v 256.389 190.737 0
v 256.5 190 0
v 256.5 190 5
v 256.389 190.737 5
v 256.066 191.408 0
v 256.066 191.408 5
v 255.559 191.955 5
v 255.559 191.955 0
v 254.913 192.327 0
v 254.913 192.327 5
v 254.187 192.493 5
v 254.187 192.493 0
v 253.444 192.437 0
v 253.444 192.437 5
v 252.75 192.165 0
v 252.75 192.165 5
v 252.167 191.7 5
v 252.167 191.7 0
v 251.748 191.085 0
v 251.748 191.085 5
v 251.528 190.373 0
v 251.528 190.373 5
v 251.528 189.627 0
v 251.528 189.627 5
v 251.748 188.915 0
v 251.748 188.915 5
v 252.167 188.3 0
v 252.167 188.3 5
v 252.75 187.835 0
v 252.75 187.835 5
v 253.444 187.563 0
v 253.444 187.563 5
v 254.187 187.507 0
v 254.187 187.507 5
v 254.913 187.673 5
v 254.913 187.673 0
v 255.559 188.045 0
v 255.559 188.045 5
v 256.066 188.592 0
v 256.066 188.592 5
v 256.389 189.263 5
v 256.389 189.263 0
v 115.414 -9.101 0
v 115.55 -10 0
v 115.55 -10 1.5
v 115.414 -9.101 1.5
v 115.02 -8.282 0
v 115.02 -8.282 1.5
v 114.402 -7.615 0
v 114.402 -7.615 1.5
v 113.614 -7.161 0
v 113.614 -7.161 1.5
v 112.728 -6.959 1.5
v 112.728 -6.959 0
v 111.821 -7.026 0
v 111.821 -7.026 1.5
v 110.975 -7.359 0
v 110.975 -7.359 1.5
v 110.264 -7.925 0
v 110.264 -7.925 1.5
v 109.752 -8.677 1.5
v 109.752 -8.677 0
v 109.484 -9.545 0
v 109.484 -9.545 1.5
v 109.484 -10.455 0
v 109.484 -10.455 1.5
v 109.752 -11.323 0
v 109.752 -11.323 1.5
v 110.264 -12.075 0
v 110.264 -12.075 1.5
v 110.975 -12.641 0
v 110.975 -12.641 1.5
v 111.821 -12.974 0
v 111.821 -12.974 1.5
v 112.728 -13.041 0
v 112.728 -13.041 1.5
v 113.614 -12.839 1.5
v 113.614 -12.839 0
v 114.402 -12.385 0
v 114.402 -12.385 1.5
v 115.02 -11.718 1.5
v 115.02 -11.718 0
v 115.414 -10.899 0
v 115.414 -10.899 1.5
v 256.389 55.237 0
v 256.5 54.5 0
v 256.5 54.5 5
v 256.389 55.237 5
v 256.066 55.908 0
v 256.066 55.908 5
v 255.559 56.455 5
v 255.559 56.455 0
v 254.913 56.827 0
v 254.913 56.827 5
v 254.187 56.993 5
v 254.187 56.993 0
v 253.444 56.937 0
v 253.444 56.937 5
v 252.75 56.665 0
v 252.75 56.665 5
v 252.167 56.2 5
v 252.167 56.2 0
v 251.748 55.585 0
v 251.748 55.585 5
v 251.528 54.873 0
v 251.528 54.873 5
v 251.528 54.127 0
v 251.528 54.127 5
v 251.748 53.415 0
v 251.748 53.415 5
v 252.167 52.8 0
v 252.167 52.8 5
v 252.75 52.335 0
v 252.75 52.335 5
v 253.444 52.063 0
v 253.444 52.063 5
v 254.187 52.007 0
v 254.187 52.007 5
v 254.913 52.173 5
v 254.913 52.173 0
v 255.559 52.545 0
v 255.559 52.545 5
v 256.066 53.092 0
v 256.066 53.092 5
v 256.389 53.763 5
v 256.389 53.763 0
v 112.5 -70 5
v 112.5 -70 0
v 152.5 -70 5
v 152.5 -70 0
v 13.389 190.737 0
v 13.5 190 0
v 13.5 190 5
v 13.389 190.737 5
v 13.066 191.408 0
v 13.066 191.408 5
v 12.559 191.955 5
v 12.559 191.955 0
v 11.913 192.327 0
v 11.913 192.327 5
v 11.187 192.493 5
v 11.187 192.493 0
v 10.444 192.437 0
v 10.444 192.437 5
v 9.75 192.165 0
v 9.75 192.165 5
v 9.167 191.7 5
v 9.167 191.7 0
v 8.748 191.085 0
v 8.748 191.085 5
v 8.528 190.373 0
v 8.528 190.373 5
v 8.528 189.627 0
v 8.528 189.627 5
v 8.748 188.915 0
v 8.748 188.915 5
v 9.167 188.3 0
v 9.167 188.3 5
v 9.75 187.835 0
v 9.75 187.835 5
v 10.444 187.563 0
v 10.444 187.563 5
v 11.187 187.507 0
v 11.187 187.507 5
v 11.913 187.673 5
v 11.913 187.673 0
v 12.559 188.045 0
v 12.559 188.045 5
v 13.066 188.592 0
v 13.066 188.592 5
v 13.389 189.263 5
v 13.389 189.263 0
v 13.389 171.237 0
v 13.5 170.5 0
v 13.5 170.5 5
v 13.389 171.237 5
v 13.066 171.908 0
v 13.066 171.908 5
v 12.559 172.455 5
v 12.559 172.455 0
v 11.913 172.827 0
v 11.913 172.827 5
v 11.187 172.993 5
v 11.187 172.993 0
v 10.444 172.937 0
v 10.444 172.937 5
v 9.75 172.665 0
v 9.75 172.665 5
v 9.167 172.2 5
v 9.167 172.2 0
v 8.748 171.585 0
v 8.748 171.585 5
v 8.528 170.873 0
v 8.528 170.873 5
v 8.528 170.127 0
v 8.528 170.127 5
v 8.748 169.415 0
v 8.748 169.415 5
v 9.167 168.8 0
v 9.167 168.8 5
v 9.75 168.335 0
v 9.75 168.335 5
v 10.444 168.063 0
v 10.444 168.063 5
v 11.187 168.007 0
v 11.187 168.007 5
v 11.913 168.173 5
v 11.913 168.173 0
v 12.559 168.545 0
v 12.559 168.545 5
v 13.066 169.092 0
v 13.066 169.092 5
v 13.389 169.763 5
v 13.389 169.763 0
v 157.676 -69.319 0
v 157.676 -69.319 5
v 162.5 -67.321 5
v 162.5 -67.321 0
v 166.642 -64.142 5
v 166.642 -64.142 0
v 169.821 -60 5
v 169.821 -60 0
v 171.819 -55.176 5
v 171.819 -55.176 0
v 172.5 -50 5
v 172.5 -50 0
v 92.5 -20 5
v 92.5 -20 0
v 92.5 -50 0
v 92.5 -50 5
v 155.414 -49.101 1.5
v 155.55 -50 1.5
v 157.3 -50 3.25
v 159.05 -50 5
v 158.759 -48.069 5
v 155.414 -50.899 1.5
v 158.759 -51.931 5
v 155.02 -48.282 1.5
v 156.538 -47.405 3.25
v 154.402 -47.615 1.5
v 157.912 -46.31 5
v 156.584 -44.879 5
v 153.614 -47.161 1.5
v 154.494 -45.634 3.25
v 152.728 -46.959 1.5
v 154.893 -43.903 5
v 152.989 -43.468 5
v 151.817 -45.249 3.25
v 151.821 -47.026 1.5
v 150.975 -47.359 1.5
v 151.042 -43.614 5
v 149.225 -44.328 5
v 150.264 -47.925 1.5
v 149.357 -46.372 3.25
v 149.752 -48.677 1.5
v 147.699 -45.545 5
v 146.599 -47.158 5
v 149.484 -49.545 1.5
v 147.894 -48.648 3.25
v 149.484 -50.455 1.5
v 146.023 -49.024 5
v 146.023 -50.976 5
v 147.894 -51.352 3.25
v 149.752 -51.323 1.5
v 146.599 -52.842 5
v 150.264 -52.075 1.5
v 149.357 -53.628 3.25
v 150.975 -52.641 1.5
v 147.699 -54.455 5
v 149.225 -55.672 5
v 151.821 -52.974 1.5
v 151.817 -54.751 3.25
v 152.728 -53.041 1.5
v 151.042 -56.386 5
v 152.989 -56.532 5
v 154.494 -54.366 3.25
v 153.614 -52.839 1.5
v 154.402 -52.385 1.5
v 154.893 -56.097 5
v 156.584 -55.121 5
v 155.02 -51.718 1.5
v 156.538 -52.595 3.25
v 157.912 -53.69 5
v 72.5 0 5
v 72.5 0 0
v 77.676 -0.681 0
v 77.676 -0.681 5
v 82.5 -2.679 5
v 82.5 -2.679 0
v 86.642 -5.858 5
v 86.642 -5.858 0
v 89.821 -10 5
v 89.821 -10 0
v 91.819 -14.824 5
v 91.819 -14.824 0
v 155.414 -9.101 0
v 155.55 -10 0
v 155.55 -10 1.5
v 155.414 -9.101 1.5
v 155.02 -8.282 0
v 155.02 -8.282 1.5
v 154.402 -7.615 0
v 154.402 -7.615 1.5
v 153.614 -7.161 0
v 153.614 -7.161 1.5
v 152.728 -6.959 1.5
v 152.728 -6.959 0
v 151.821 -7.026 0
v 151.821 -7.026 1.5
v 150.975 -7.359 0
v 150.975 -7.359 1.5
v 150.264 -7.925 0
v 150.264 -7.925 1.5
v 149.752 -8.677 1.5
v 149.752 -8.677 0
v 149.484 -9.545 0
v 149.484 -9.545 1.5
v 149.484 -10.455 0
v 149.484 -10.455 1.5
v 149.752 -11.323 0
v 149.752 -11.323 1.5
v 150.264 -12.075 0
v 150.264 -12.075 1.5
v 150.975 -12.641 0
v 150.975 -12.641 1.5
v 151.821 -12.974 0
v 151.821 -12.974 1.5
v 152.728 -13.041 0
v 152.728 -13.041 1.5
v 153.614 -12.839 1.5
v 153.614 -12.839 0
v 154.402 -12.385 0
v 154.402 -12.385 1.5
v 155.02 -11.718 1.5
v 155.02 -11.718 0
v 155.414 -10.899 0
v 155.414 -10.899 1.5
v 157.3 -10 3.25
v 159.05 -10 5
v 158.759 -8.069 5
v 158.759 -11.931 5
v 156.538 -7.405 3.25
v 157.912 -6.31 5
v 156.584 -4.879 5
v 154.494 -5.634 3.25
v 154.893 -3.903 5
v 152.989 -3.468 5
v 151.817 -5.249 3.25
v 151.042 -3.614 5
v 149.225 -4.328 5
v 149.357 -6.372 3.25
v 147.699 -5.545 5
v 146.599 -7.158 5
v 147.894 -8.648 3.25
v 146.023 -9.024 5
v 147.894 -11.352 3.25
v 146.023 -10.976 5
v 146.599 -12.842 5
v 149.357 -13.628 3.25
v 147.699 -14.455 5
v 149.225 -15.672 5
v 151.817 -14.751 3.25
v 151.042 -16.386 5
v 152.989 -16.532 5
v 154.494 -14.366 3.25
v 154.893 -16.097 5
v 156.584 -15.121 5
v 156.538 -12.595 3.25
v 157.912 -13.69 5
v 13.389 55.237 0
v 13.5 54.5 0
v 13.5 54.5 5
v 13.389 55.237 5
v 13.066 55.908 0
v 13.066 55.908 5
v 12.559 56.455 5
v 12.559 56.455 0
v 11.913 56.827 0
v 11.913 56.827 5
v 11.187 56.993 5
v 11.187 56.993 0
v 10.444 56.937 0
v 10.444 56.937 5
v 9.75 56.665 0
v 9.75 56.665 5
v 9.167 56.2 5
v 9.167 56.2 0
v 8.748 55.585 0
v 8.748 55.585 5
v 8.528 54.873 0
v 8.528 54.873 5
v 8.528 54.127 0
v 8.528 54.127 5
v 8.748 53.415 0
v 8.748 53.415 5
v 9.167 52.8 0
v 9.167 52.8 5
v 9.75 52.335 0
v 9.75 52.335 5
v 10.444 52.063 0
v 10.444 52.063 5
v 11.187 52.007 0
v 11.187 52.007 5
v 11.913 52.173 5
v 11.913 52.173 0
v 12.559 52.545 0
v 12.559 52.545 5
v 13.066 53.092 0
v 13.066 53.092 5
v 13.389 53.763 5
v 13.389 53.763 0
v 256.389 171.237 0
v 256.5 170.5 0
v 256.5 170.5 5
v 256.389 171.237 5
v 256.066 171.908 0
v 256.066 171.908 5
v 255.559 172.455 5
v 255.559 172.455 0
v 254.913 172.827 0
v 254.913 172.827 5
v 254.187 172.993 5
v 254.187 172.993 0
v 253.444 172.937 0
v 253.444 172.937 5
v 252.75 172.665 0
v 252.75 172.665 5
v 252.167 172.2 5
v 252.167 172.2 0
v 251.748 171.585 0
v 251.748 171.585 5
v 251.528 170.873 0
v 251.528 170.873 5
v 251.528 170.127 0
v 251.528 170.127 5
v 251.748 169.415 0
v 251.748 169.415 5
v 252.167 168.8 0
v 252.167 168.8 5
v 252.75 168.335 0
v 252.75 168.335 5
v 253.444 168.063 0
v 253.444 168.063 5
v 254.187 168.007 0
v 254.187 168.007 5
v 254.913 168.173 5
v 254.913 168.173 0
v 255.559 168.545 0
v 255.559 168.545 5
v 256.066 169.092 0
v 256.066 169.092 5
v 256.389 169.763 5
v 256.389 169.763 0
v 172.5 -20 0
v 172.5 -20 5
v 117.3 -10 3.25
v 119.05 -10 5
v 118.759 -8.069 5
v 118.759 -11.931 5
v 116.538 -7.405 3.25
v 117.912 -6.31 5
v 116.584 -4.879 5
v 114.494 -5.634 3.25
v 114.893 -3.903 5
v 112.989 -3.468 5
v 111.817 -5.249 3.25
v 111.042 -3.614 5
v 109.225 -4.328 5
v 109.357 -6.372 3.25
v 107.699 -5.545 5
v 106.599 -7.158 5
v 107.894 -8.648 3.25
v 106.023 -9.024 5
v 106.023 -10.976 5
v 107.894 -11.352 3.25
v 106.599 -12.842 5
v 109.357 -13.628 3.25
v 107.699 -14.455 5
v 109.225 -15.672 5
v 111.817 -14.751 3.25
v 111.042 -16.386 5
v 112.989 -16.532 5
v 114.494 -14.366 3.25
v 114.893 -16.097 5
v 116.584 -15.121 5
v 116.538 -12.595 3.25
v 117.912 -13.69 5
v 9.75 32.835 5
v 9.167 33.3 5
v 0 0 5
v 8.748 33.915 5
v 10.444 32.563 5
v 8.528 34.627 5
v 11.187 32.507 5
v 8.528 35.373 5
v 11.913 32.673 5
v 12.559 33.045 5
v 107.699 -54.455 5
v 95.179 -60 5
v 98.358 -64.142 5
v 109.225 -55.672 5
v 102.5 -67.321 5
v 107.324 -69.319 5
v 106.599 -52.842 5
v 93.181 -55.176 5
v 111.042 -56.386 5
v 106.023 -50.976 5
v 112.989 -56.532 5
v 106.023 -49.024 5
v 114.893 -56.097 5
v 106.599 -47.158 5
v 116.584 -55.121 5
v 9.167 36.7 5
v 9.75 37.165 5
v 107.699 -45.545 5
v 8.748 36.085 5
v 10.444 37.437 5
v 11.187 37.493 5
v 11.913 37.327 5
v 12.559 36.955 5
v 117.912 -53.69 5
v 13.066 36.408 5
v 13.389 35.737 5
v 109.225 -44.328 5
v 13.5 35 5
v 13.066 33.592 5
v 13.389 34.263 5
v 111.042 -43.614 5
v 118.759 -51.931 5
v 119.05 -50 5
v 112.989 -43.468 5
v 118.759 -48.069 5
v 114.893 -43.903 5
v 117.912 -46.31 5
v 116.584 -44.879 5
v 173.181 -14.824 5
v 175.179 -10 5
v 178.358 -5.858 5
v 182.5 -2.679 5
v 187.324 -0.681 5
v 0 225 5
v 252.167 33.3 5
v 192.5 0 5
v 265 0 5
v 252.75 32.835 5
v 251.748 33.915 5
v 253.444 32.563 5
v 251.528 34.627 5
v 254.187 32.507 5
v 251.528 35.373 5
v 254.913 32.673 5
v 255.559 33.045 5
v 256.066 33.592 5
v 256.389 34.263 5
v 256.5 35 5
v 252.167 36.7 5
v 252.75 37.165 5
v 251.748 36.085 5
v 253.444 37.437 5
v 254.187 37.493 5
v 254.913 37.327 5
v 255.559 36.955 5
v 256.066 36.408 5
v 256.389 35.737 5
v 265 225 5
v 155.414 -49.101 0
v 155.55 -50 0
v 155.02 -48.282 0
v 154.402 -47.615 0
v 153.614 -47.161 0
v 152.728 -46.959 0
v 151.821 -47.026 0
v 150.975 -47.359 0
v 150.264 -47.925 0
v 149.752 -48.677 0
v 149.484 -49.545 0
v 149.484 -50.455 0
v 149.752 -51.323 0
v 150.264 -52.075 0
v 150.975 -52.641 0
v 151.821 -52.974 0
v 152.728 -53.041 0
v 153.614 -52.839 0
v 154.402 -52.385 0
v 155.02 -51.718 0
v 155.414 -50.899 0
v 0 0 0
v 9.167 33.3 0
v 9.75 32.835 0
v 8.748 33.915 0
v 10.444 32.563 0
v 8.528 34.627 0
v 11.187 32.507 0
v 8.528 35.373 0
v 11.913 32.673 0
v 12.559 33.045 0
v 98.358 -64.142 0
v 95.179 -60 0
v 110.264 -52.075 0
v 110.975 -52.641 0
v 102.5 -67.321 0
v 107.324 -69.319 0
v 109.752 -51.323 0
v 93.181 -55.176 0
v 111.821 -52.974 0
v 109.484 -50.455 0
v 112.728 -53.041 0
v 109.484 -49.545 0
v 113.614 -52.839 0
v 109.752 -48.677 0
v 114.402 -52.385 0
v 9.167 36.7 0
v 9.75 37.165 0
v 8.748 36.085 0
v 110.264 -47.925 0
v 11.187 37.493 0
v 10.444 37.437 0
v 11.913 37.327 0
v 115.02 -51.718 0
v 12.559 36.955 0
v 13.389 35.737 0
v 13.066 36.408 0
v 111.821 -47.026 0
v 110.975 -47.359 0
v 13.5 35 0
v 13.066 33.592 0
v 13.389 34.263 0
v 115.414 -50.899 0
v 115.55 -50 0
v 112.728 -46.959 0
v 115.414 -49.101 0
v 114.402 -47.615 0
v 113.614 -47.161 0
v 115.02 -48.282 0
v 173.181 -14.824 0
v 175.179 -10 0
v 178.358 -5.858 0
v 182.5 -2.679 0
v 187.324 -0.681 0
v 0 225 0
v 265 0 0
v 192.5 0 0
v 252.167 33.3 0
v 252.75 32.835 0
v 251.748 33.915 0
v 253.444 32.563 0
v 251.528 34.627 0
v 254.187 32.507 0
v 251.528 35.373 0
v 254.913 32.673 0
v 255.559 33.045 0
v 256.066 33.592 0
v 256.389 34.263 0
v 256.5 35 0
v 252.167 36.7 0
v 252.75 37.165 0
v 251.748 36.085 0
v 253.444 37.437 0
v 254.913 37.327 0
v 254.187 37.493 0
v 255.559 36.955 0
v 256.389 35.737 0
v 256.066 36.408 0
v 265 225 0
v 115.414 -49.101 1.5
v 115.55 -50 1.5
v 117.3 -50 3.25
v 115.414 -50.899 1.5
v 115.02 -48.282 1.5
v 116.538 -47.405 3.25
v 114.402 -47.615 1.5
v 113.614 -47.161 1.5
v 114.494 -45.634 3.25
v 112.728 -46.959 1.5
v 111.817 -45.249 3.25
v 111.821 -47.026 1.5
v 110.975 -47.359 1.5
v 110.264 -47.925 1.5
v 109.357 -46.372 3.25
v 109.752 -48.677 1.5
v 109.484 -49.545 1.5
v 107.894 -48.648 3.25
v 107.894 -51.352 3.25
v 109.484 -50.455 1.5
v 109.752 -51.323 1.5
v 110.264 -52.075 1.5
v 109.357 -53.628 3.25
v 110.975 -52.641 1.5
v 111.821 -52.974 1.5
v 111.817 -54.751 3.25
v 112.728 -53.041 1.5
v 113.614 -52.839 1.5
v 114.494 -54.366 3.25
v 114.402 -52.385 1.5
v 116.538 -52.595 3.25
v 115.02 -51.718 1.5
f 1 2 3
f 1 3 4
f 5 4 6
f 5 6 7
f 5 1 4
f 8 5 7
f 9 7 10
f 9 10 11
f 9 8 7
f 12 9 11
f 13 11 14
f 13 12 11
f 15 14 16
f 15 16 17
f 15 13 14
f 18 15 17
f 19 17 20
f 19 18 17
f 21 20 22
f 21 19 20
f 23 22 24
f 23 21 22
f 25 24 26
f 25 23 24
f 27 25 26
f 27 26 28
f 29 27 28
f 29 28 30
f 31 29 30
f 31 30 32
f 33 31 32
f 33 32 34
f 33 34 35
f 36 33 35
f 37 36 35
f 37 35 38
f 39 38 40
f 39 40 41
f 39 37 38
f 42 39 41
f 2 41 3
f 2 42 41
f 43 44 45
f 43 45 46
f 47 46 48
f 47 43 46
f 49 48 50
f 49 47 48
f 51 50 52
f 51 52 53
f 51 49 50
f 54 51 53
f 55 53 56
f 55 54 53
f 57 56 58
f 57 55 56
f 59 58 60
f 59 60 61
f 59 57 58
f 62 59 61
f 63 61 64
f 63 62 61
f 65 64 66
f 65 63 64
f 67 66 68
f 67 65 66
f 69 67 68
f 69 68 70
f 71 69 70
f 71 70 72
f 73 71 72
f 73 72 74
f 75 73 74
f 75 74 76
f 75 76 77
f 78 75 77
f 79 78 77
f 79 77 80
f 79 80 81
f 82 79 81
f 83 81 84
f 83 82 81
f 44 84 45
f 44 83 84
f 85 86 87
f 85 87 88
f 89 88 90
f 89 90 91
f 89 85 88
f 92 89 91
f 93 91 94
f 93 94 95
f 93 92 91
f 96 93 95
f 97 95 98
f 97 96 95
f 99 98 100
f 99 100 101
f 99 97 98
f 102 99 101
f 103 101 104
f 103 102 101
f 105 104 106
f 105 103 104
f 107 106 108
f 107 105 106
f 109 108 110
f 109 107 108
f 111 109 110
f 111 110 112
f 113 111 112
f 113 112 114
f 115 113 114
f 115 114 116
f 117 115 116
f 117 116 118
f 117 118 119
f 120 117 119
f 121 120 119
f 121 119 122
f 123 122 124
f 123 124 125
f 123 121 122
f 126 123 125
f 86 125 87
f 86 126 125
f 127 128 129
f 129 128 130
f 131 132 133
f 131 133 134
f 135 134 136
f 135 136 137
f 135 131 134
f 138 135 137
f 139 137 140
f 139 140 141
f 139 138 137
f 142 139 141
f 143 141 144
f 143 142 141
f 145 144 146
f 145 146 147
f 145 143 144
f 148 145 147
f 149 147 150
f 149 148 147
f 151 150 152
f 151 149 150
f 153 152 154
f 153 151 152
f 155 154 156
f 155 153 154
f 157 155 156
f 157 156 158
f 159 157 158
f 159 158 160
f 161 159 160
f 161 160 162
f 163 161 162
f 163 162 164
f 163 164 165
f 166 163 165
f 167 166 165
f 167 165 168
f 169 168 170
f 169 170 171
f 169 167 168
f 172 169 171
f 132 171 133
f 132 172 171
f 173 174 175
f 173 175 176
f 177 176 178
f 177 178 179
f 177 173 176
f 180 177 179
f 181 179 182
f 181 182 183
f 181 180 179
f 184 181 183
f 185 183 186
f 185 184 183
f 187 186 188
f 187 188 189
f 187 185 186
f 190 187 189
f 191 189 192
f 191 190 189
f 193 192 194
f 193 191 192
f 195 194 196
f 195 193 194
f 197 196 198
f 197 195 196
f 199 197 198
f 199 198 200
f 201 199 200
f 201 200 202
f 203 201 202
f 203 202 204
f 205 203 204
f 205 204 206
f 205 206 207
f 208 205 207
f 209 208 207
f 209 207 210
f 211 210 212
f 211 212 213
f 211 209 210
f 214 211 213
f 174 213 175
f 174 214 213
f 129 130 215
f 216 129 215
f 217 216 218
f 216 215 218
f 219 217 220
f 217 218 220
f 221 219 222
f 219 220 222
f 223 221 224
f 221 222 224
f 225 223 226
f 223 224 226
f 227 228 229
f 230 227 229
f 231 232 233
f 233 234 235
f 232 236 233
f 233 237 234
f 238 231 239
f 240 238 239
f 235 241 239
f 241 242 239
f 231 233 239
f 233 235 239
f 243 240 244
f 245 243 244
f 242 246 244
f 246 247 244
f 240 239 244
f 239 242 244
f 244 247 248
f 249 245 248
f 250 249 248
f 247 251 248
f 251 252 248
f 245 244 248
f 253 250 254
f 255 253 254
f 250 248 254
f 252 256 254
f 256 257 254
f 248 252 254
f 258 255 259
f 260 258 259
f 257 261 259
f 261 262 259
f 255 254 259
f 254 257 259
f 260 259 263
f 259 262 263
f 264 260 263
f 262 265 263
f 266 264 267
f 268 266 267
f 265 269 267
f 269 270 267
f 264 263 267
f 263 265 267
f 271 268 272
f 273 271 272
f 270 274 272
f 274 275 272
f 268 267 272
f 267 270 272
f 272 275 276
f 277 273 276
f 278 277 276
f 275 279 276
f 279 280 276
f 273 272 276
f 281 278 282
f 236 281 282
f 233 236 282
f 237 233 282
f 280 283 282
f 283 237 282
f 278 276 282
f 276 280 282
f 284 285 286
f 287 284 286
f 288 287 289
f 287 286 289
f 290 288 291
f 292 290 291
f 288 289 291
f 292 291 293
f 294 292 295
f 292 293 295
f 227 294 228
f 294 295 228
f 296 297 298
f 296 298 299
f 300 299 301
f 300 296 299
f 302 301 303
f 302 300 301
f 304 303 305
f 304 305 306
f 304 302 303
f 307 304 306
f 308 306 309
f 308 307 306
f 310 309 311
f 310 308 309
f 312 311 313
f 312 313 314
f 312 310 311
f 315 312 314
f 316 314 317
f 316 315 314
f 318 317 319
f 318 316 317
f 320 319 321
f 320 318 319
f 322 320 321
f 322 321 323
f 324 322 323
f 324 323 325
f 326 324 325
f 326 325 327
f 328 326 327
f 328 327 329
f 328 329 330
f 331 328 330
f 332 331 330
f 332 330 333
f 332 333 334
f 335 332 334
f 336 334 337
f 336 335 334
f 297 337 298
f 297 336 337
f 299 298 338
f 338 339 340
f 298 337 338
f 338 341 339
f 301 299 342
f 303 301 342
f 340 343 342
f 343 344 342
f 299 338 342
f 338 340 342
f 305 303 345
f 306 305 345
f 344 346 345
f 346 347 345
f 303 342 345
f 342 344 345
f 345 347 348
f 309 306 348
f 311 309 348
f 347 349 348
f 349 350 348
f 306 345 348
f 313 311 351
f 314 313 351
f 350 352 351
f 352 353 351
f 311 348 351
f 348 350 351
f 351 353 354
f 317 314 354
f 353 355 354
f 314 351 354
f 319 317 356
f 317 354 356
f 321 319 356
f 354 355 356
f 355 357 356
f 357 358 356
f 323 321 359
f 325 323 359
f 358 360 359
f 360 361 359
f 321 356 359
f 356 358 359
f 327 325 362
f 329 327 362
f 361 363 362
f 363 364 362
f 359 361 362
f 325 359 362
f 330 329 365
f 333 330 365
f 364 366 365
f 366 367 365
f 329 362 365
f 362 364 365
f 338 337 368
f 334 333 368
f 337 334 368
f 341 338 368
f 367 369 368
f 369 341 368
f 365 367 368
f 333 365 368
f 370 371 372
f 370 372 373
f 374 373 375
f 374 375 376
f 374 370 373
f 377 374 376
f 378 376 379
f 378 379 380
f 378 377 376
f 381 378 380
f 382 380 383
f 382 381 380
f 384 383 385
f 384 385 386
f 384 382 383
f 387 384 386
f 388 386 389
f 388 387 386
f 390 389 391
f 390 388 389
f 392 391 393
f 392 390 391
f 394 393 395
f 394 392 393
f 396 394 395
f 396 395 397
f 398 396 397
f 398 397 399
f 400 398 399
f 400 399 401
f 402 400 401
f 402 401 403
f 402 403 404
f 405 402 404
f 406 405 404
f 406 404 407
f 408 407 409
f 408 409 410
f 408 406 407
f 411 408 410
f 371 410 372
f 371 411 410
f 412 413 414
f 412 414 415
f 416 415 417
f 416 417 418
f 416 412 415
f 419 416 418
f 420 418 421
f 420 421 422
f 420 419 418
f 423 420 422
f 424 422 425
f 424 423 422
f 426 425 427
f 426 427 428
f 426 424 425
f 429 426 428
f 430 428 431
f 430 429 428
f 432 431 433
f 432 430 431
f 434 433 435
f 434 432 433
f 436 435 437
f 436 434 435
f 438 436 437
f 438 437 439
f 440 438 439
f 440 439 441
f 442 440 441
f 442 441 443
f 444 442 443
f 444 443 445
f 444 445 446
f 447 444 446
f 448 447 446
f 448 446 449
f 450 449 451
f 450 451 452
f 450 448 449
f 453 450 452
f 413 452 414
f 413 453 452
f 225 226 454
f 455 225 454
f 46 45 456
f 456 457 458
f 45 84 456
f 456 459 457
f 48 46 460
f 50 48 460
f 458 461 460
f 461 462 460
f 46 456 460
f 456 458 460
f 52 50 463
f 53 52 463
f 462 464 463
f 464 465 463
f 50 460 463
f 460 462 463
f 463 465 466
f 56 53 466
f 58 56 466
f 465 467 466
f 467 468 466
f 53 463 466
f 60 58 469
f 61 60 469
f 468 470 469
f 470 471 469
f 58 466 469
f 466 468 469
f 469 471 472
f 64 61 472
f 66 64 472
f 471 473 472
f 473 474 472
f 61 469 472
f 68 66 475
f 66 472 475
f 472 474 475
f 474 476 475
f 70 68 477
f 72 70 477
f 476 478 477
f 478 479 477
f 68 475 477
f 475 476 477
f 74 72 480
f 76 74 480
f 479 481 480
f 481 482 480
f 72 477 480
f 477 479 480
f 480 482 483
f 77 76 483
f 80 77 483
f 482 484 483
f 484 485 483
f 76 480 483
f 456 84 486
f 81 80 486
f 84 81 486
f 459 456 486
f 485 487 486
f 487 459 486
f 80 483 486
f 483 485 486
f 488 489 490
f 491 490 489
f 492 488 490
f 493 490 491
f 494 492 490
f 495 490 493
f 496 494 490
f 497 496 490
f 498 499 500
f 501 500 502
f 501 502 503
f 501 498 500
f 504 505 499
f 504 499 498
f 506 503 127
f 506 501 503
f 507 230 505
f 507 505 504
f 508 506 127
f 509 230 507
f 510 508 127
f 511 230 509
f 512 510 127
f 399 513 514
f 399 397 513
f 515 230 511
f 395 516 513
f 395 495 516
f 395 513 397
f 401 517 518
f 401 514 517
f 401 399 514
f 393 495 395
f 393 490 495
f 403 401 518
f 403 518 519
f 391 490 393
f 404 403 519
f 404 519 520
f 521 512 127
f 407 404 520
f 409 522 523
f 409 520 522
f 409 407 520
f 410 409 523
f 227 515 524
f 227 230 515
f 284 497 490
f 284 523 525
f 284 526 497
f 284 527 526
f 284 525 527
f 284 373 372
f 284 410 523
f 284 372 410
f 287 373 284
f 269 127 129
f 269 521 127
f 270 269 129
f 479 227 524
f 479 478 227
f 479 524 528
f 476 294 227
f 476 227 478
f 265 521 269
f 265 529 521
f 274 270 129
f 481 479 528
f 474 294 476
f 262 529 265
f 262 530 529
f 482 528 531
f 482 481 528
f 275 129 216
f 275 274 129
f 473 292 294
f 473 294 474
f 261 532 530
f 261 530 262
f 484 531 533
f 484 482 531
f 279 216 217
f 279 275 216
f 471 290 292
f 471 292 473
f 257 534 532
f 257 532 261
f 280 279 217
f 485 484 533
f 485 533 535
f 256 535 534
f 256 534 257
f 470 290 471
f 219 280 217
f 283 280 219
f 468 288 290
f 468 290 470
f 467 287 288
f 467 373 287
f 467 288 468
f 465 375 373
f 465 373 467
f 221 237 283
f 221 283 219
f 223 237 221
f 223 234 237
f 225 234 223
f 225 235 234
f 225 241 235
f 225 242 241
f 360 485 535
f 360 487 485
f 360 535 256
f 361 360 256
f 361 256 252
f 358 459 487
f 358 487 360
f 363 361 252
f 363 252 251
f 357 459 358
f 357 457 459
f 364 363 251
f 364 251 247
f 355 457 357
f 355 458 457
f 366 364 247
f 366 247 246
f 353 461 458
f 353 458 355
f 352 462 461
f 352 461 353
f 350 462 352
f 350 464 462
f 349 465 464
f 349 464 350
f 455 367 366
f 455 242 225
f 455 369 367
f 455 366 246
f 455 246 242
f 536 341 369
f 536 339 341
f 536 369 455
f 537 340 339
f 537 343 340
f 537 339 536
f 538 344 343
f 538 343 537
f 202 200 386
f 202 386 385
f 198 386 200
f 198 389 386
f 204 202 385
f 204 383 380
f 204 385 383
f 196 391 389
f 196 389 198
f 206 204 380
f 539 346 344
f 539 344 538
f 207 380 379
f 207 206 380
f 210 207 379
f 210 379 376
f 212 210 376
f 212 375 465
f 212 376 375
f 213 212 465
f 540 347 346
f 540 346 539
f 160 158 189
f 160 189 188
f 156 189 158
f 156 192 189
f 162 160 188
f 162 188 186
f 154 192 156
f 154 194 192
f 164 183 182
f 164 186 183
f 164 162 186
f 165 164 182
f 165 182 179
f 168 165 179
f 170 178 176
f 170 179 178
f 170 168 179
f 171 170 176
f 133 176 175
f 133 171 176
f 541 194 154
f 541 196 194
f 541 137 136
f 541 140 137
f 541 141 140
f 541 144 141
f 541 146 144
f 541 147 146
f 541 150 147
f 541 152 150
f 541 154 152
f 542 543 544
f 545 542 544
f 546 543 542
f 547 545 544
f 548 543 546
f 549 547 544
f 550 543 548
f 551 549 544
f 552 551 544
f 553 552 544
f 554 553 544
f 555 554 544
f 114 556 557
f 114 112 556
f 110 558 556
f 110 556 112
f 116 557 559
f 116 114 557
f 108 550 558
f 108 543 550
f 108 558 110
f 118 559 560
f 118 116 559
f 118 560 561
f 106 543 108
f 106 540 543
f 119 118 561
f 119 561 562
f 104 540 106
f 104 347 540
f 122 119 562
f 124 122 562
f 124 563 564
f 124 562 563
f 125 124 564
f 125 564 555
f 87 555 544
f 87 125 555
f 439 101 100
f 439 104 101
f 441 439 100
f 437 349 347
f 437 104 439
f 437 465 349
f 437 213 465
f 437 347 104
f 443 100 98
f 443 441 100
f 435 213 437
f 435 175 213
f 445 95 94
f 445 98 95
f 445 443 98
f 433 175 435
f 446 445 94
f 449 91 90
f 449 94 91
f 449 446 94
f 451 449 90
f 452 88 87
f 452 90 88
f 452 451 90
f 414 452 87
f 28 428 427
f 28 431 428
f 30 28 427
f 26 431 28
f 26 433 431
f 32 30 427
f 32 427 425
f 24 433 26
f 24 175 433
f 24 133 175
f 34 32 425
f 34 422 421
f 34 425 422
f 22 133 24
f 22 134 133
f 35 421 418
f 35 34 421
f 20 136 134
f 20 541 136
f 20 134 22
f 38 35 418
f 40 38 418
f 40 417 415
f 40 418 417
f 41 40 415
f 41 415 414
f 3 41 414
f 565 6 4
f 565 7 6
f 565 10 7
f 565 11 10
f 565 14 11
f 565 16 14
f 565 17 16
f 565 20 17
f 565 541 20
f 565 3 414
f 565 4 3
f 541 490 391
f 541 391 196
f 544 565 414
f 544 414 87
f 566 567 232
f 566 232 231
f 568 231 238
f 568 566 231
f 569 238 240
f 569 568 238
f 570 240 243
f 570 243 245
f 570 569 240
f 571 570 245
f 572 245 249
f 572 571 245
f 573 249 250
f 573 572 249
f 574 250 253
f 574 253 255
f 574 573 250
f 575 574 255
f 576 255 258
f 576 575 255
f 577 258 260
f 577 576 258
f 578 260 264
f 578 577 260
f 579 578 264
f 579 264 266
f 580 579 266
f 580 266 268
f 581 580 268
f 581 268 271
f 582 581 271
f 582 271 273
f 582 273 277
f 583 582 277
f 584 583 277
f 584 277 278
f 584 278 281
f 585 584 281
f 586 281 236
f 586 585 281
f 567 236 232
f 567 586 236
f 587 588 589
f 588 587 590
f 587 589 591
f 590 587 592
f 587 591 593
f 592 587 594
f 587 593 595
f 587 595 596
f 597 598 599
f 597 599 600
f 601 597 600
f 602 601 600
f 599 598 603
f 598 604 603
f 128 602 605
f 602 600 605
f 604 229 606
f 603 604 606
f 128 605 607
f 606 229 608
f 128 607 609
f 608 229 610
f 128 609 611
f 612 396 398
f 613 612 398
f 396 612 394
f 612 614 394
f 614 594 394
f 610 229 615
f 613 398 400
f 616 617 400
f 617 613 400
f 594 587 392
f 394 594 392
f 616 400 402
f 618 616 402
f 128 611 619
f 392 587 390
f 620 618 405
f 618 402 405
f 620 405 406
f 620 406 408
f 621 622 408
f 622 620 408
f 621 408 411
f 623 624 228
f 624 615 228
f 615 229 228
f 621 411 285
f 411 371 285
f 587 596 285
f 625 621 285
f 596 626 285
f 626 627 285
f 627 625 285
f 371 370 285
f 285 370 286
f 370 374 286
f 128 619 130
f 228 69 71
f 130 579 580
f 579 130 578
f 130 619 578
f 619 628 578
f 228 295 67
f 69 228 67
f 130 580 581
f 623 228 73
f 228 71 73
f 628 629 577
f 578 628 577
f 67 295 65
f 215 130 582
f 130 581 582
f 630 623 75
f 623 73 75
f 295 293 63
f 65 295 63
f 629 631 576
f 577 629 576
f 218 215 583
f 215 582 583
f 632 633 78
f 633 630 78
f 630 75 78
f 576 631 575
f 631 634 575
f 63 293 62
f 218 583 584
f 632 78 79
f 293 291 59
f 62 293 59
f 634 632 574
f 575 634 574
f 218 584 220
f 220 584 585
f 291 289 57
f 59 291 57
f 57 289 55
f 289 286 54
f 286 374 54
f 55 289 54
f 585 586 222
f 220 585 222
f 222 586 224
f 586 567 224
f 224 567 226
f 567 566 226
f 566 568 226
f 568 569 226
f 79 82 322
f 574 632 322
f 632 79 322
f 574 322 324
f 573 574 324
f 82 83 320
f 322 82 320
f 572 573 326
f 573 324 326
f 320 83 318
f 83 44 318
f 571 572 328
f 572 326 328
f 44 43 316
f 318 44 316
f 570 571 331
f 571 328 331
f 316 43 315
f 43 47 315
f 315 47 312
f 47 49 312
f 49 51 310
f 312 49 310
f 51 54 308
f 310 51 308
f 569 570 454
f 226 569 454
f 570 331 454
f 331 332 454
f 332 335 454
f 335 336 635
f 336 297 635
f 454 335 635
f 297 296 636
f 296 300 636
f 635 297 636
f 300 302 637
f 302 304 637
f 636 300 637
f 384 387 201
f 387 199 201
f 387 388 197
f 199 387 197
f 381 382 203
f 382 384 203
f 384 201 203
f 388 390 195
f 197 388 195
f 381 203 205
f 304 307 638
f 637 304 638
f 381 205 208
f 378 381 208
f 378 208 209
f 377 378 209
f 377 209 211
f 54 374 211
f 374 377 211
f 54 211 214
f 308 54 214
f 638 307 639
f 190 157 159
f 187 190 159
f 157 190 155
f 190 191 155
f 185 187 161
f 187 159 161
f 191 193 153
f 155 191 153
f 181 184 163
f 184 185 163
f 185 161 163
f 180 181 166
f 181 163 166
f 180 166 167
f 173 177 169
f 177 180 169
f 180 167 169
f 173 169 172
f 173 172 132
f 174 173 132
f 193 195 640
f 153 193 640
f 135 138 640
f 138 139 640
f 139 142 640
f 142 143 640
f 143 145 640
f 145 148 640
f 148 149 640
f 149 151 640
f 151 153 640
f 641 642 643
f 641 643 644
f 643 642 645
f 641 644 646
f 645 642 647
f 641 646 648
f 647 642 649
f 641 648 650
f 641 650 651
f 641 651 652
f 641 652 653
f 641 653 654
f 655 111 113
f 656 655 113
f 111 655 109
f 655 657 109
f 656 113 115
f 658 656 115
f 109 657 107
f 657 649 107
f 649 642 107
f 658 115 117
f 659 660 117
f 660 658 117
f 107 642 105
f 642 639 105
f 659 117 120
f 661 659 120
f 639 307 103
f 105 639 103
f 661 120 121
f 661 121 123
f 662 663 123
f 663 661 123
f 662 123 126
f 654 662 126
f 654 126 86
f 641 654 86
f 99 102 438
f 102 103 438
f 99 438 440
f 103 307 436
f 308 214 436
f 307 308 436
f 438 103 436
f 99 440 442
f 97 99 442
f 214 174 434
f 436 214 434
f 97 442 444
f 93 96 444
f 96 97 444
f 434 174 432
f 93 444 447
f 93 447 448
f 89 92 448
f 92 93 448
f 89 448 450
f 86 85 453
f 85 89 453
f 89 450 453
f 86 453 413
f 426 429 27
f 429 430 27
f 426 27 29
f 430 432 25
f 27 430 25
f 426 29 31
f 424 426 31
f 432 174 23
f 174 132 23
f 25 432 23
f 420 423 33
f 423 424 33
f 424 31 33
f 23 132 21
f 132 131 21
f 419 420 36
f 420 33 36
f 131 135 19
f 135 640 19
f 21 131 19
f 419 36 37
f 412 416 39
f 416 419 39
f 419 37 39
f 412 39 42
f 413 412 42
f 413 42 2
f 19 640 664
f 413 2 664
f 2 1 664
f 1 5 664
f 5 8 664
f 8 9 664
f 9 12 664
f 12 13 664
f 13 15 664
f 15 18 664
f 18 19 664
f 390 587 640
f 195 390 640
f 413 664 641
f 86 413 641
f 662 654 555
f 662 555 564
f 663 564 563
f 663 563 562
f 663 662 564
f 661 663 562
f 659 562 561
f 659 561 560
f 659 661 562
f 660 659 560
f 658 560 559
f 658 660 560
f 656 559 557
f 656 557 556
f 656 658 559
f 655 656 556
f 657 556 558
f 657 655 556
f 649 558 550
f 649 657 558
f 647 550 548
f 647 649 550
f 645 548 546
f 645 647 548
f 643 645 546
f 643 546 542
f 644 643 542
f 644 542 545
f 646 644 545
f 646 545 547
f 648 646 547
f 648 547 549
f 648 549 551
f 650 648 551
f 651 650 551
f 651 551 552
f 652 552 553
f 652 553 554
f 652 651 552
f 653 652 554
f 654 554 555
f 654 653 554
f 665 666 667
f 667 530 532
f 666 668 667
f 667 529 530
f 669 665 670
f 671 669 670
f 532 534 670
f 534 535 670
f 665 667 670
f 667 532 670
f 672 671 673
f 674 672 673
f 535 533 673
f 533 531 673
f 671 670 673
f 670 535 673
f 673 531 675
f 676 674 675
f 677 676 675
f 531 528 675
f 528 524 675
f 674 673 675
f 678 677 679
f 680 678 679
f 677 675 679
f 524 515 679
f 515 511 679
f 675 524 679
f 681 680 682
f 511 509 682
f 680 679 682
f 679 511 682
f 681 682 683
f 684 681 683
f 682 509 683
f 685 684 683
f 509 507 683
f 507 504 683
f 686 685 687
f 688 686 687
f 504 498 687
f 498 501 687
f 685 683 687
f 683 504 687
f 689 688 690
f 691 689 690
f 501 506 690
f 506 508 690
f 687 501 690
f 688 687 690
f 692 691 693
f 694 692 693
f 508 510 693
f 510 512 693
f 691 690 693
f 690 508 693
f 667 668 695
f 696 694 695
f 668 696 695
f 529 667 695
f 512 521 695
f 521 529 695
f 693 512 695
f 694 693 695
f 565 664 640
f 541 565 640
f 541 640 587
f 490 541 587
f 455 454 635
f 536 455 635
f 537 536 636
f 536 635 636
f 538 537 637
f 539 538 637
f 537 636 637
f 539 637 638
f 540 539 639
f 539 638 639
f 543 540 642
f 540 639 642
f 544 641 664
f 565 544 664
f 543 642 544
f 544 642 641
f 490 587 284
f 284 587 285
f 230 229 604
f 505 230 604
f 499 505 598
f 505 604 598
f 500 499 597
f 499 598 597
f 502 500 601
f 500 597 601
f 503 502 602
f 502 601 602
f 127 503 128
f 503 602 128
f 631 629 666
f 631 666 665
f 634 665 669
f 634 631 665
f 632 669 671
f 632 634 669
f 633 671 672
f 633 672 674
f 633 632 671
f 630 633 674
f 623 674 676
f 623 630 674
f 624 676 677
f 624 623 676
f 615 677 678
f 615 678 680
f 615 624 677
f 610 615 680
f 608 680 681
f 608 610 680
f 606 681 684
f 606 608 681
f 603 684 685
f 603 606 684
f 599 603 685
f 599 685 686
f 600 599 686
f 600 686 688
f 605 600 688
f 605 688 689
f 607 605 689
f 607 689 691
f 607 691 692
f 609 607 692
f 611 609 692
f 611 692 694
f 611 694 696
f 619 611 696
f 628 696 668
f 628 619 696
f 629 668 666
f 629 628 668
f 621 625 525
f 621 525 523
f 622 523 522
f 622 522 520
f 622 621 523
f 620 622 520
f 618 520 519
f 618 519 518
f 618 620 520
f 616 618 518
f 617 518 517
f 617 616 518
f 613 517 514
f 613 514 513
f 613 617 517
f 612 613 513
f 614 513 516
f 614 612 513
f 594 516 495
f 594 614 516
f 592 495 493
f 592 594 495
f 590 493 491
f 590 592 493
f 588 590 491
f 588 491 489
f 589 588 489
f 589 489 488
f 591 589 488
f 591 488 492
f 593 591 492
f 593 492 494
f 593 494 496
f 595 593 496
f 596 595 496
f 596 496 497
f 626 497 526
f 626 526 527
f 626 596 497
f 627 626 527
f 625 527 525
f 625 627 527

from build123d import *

# Parameters (mm, degrees)
F0_R     = 3.05
F0_R_2   = 2.5
F1_DEPTH = 5
F2_SIZE  = 3.5


with BuildPart() as f1:
    # F0 (on Top) → F1 (new body)
    with BuildSketch(Plane.XY):
        with BuildLine():
            Line((0, 225), (0, 0))
            Line((0, 0), (72.5, 0))
            ThreePointArc((72.5, 0), (86.642136, -5.857864), (92.5, -20))
            Line((92.5, -20), (92.5, -50))
            ThreePointArc((92.5, -50), (98.357864, -64.142136), (112.5, -70))
            Line((112.5, -70), (152.5, -70))
            ThreePointArc((152.5, -70), (166.642136, -64.142136), (172.5, -50))
            Line((172.5, -50), (172.5, -20))
            ThreePointArc((172.5, -20), (178.357864, -5.857864), (192.5, 0))
            Line((192.5, 0), (265, 0))
            Line((265, 0), (265, 225))
            Line((265, 225), (0, 225))
        make_face()
        with Locations((112.5, -50)):
            Circle(F0_R, mode=Mode.SUBTRACT)
        with Locations((112.5, -10)):
            Circle(F0_R, mode=Mode.SUBTRACT)
        with Locations((11, 35)):
            Circle(F0_R_2, mode=Mode.SUBTRACT)
        with Locations((11, 54.5)):
            Circle(F0_R_2, mode=Mode.SUBTRACT)
        with Locations((152.5, -50)):
            Circle(F0_R, mode=Mode.SUBTRACT)
        with Locations((152.5, -10)):
            Circle(F0_R, mode=Mode.SUBTRACT)
        with Locations((254, 35)):
            Circle(F0_R_2, mode=Mode.SUBTRACT)
        with Locations((254, 54.5)):
            Circle(F0_R_2, mode=Mode.SUBTRACT)
        with Locations((11, 170.5)):
            Circle(F0_R_2, mode=Mode.SUBTRACT)
        with Locations((11, 190)):
            Circle(F0_R_2, mode=Mode.SUBTRACT)
        with Locations((254, 170.5)):
            Circle(F0_R_2, mode=Mode.SUBTRACT)
        with Locations((254, 190)):
            Circle(F0_R_2, mode=Mode.SUBTRACT)
    extrude(amount=F1_DEPTH)

    # F2
    f2_edges = [f1.edges().sort_by_distance(p)[0] for p in [
        (109.45, -10, 5),
        (149.45, -10, 5),
        (109.45, -50, 5),
        (149.45, -50, 5),
    ]]
    chamfer(f2_edges, length=F2_SIZE)


solid = f1.part
